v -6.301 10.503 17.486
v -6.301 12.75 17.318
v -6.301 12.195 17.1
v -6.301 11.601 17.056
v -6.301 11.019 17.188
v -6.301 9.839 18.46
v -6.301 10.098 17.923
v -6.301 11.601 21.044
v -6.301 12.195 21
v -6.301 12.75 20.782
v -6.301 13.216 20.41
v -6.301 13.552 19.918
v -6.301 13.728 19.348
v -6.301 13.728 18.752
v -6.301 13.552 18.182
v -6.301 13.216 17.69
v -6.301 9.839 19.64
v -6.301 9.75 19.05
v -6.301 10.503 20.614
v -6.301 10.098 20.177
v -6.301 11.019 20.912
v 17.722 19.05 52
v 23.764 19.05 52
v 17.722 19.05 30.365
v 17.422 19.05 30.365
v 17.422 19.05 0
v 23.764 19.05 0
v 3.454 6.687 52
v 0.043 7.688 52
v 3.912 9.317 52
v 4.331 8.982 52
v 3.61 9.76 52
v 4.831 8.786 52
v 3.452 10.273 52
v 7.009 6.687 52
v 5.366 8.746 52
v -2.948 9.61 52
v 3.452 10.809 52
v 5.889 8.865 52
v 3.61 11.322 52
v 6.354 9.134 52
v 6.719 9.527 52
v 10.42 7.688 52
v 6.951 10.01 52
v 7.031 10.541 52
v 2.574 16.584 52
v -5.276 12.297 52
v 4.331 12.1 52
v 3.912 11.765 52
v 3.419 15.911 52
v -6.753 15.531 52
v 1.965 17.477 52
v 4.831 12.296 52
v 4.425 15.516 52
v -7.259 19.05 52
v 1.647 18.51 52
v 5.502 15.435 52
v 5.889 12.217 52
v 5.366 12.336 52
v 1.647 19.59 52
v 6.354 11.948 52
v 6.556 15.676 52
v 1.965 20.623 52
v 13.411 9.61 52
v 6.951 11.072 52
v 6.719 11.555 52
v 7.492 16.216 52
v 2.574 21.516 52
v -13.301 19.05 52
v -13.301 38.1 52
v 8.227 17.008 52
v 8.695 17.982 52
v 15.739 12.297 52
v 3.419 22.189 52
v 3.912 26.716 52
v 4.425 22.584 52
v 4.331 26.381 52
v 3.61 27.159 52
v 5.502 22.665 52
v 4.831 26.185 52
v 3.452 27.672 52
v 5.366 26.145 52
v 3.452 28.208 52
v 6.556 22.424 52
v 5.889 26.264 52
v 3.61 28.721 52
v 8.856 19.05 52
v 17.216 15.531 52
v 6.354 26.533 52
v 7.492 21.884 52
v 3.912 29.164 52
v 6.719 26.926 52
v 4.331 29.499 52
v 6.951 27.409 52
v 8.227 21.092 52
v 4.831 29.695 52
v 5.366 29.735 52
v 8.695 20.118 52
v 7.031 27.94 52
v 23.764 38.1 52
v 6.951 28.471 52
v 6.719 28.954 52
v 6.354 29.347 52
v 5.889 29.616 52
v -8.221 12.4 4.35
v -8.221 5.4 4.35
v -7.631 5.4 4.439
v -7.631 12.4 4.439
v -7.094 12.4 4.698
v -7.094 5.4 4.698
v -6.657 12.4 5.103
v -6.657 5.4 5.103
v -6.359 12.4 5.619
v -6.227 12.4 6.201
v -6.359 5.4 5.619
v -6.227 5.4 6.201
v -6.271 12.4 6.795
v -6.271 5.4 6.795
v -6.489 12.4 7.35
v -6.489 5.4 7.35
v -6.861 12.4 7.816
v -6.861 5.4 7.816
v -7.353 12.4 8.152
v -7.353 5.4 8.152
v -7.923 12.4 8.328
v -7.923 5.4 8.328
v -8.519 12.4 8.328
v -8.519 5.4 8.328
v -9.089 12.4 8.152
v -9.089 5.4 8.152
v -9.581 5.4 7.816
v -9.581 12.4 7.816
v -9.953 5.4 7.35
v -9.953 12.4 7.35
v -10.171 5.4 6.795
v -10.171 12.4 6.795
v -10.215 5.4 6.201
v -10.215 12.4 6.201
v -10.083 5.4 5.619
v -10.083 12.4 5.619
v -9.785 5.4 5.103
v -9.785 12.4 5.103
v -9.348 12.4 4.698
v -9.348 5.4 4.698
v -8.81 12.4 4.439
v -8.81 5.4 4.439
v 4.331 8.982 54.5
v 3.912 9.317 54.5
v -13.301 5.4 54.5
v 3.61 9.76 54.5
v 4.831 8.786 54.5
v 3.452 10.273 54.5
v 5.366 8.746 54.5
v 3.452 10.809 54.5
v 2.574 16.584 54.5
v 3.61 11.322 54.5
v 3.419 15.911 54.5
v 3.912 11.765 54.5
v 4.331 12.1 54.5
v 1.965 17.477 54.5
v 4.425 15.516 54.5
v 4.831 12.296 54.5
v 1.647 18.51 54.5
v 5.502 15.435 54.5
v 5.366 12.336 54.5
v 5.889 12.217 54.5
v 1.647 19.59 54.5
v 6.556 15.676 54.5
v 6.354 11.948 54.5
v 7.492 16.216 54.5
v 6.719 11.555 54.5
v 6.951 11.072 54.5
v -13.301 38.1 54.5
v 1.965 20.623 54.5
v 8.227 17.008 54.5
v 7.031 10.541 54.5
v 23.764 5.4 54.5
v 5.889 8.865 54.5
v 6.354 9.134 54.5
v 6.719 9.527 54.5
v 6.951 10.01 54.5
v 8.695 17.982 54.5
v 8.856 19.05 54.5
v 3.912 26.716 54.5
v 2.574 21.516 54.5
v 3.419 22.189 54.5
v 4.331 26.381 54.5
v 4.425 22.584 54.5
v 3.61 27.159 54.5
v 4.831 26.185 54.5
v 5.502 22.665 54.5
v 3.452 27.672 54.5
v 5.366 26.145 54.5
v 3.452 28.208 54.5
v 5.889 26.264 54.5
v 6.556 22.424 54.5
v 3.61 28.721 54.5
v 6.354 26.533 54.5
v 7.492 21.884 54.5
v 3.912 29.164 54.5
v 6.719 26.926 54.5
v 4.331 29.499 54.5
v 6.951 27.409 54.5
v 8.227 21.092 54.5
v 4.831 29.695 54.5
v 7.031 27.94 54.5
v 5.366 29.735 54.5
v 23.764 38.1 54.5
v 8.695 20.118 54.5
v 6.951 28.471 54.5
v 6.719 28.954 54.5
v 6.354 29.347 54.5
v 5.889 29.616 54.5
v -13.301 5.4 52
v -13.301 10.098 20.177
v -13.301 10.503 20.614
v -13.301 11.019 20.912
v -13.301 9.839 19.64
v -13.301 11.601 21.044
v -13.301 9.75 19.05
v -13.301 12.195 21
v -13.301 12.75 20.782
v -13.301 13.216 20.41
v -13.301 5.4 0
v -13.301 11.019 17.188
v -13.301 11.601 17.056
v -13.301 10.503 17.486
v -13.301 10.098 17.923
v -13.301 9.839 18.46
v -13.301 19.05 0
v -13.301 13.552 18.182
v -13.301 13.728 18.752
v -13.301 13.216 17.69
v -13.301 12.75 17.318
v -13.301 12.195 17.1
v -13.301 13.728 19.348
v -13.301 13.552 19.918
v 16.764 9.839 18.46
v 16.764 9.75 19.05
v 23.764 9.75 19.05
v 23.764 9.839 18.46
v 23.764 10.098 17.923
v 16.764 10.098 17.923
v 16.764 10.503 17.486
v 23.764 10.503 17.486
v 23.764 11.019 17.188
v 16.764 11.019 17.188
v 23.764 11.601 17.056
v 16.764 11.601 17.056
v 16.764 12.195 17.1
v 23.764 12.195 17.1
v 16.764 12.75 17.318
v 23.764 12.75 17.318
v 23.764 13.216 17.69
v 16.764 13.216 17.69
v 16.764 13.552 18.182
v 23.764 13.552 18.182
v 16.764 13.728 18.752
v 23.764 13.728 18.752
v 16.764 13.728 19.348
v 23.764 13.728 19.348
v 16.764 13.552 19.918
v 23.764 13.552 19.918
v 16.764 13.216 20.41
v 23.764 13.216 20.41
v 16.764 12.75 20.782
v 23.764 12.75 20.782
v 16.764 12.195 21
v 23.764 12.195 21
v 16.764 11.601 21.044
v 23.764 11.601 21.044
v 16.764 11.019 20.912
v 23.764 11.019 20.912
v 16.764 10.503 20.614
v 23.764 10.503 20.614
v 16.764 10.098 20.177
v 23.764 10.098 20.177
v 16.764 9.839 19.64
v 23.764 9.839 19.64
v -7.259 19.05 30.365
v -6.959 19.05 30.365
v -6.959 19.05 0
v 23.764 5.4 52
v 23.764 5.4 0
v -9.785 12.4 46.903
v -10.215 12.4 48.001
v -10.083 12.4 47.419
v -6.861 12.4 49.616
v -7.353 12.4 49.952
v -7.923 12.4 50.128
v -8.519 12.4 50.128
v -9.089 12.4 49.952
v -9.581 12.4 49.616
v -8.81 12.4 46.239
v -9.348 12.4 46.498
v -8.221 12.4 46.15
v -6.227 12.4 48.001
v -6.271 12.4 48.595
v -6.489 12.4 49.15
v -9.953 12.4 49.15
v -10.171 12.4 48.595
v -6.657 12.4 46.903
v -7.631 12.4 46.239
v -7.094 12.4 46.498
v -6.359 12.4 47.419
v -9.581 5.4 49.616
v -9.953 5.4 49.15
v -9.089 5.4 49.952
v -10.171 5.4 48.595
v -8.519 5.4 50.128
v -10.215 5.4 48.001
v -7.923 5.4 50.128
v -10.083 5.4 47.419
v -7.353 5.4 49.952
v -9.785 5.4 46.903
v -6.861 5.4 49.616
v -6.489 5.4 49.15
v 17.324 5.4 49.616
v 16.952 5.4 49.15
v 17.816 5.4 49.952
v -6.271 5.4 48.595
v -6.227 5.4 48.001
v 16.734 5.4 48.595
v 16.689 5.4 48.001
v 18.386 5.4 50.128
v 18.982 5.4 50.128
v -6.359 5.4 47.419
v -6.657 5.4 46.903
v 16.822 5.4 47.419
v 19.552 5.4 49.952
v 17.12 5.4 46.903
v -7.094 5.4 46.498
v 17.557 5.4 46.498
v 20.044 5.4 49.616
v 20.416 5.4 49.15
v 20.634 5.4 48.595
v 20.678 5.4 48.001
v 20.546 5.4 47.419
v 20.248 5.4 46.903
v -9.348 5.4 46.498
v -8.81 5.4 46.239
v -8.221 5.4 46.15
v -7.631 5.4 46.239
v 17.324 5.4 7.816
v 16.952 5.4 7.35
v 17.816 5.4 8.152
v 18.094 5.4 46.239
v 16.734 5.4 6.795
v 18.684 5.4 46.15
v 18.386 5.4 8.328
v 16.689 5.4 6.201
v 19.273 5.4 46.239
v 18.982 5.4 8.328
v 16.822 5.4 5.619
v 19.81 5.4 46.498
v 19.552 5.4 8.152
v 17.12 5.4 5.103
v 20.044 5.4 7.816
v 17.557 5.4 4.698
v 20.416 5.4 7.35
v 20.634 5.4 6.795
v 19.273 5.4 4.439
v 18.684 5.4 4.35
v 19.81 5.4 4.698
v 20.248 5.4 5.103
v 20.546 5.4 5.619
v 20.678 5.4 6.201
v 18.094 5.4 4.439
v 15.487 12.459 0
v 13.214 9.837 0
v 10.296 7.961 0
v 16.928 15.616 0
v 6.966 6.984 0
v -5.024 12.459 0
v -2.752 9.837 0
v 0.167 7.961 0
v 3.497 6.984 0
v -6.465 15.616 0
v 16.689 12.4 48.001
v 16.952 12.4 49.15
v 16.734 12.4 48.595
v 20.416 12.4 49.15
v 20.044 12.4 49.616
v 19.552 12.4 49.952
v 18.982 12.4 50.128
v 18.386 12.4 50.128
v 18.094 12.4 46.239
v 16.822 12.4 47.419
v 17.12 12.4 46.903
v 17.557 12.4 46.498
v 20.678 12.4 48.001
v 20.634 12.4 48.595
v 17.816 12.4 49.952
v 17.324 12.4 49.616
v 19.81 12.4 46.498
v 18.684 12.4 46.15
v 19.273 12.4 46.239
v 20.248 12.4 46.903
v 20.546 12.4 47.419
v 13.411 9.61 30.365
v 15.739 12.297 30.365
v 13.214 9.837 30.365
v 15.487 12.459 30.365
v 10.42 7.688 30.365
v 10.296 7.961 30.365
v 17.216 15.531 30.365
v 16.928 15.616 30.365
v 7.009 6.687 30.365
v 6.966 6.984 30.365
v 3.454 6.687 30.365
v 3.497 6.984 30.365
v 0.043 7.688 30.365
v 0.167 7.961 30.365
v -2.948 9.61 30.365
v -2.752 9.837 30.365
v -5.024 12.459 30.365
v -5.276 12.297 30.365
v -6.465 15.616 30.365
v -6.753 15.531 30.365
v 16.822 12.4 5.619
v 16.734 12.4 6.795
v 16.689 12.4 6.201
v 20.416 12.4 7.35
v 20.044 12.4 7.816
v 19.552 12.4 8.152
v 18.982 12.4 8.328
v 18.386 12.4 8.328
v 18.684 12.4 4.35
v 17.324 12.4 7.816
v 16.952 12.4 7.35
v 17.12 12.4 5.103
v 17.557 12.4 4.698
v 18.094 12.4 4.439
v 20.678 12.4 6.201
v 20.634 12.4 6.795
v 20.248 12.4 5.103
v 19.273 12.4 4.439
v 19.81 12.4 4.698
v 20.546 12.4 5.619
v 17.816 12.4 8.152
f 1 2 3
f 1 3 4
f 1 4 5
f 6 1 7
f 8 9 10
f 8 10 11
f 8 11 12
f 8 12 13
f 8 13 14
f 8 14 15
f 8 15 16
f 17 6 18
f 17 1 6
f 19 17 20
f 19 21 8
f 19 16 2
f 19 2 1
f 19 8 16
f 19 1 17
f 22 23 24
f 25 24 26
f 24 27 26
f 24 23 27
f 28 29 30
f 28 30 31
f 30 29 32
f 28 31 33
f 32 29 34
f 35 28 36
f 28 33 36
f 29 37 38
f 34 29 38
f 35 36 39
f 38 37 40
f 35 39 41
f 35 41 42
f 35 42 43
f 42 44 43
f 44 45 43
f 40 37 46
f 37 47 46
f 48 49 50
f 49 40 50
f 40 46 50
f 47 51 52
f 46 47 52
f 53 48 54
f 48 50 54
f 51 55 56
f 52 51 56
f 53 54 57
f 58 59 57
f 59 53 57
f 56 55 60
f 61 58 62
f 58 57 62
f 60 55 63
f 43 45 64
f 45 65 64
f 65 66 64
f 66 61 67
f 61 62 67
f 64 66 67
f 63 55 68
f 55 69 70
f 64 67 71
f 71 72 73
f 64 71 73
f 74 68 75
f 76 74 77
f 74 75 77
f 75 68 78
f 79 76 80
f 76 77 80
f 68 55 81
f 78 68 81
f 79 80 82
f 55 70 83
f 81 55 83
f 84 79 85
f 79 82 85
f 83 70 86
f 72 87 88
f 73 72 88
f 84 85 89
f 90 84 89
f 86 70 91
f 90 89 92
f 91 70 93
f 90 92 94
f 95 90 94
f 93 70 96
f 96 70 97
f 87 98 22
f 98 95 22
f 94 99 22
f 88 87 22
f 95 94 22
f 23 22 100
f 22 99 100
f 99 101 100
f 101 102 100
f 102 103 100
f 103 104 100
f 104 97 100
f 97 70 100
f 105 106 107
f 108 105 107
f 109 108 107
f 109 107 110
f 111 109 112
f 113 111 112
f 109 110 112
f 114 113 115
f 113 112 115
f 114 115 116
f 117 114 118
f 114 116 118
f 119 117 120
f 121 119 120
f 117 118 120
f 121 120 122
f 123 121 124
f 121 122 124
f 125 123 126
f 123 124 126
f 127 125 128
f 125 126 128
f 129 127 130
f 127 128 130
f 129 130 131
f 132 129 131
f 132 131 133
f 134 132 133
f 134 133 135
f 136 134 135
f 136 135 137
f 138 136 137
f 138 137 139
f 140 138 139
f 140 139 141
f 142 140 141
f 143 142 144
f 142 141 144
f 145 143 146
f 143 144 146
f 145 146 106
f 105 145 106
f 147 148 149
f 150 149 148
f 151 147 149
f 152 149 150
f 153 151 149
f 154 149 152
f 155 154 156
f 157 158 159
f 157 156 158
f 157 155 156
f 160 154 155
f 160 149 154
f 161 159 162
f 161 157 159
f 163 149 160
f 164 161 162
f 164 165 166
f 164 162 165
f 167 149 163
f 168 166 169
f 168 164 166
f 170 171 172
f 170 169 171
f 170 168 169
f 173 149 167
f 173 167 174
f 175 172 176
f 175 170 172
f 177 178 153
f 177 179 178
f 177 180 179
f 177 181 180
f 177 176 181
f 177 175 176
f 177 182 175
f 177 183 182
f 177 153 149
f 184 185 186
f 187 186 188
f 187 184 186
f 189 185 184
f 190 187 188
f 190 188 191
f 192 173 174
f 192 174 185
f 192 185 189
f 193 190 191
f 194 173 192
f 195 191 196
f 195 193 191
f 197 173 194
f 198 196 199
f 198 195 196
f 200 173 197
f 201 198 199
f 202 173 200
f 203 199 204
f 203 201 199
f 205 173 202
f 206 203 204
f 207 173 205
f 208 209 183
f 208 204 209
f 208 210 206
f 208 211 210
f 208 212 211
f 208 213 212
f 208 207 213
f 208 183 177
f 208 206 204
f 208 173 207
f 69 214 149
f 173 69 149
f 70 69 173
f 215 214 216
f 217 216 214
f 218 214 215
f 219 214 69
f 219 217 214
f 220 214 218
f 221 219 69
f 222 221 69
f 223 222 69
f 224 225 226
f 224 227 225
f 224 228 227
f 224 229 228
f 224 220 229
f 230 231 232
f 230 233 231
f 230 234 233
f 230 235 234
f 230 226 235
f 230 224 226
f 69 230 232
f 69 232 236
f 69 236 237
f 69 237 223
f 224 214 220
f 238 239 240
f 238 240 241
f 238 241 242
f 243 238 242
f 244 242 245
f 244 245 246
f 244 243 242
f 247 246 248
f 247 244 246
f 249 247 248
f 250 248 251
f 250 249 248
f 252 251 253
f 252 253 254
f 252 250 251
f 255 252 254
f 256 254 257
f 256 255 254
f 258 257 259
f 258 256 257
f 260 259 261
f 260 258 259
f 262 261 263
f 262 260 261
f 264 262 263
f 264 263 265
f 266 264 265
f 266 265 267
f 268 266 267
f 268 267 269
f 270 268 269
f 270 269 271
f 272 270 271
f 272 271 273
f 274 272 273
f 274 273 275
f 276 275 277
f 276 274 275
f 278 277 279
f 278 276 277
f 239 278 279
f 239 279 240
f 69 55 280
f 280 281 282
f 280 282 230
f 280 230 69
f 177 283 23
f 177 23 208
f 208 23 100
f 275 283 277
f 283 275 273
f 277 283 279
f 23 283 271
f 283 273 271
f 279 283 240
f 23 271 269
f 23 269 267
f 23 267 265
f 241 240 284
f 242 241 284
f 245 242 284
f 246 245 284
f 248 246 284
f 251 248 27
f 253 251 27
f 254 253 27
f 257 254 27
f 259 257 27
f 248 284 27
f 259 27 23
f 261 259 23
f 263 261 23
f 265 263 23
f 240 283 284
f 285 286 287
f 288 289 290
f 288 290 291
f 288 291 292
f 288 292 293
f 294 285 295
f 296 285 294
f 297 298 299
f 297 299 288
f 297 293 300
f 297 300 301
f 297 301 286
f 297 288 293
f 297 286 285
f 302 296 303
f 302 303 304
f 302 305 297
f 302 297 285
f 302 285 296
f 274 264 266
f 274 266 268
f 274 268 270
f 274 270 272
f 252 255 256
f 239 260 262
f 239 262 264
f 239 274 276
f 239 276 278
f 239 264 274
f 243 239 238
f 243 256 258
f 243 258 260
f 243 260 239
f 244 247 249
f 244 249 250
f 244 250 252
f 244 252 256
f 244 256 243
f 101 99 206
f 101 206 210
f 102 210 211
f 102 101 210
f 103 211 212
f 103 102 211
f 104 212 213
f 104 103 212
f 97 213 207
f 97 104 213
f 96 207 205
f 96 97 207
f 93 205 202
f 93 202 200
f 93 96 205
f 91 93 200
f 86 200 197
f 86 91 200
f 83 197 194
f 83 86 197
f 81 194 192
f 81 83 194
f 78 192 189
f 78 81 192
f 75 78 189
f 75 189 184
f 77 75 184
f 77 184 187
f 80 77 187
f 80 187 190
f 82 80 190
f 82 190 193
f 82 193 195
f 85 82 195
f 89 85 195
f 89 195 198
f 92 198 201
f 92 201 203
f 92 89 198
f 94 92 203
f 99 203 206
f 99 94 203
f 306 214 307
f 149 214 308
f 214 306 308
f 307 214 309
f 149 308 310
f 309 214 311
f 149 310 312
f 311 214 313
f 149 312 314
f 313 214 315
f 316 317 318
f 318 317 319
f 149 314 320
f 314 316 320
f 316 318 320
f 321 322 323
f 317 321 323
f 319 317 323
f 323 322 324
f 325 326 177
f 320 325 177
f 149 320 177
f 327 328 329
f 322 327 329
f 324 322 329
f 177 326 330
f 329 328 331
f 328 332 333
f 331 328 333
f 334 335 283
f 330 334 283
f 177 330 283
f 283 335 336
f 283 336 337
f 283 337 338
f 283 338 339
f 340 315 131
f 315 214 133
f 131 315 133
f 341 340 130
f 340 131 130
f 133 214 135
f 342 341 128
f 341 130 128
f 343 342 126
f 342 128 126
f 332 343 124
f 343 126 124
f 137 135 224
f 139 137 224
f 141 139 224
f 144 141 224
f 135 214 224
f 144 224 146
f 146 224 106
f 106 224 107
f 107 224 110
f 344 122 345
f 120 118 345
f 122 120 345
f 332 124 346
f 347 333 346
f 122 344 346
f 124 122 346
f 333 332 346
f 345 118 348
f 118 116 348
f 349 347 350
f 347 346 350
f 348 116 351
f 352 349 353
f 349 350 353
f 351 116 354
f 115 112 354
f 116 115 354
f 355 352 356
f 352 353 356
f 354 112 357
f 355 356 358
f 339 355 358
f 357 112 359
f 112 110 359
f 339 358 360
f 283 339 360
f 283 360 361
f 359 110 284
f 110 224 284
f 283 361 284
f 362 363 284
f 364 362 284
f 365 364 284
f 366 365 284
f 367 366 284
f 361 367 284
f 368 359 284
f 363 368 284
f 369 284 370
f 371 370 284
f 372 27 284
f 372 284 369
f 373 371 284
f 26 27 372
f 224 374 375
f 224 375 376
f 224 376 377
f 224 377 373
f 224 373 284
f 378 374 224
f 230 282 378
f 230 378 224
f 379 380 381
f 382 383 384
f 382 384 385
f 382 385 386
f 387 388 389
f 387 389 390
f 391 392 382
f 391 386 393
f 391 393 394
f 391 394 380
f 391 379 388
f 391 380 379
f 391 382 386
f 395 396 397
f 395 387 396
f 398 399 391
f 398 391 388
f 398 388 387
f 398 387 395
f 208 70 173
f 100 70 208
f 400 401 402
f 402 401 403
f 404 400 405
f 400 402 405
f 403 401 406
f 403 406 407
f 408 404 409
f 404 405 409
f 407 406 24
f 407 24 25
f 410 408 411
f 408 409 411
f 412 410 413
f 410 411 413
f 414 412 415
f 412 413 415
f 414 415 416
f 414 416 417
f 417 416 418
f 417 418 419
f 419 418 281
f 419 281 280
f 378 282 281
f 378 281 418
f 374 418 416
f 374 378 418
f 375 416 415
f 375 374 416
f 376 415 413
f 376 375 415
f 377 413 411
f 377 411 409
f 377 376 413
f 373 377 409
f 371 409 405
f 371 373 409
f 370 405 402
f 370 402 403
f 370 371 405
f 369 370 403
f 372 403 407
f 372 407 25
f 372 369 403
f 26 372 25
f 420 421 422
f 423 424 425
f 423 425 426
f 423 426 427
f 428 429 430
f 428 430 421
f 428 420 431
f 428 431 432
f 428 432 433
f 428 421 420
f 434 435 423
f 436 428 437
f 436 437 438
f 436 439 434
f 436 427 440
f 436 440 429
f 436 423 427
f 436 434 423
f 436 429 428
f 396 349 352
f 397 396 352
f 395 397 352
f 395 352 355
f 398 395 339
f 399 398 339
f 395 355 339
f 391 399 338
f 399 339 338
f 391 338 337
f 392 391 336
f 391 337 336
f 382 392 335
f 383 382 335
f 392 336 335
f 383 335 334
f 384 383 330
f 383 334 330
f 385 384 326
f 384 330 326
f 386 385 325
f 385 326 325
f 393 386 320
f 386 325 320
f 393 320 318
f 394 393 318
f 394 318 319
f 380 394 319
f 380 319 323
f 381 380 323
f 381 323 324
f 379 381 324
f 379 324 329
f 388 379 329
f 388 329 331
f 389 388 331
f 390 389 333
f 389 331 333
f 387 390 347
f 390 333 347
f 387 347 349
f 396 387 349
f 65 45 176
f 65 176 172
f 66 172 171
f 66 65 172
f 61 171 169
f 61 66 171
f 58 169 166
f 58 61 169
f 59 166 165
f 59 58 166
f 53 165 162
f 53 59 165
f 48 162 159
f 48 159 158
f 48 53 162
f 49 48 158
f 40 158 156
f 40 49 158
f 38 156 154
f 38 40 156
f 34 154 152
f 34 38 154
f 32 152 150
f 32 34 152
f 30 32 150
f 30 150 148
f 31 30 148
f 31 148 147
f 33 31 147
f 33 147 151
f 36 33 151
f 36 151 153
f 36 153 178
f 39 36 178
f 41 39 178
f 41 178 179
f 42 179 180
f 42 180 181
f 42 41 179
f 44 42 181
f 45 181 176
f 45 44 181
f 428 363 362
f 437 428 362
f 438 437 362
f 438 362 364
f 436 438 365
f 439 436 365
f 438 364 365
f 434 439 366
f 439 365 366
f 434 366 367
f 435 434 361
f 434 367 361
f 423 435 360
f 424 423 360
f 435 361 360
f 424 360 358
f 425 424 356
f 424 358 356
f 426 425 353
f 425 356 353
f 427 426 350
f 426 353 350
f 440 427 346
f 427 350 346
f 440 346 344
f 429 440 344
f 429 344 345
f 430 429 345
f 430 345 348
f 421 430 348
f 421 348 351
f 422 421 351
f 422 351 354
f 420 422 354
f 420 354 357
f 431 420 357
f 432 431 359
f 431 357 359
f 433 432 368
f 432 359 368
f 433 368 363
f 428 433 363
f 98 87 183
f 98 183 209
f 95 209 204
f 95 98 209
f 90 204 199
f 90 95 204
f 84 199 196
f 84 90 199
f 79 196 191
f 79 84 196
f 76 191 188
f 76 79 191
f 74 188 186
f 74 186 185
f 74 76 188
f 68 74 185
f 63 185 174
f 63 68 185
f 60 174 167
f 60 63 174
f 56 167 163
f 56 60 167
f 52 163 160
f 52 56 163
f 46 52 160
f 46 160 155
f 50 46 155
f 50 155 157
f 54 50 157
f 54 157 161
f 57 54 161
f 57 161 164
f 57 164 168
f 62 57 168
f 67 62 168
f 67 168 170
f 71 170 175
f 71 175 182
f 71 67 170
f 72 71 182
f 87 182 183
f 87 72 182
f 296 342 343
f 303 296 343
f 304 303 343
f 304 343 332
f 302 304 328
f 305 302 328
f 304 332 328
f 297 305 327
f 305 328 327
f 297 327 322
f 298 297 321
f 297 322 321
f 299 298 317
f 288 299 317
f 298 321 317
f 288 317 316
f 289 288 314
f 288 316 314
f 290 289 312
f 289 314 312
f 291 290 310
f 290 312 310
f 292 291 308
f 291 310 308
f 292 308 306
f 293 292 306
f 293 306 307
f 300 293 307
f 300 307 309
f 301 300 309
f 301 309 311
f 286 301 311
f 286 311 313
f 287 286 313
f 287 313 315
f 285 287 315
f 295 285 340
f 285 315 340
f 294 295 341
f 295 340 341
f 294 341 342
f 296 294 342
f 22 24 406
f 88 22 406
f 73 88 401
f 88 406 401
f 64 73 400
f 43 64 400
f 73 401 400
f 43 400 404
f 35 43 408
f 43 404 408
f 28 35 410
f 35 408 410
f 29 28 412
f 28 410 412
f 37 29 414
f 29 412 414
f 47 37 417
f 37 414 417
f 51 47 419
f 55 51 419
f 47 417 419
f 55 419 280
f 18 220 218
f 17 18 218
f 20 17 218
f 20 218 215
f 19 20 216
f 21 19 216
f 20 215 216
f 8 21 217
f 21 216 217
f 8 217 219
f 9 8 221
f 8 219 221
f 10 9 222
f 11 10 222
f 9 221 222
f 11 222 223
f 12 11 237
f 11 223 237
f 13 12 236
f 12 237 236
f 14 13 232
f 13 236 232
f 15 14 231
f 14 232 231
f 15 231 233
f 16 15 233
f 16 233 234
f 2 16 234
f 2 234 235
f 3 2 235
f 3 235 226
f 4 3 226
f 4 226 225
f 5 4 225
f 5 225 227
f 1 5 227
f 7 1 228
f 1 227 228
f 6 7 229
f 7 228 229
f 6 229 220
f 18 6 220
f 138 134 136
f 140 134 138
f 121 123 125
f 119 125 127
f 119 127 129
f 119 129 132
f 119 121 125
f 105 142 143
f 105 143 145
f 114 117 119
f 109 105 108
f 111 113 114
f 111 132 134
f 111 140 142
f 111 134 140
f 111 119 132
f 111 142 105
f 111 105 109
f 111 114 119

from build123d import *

# Parameters (mm, degrees)
BOSS_EXTRUDE1_DEPTH = 30.364999976
BOSS_EXTRUDE2_DEPTH = 21.63499991
SKETCH4_W           = 37.064796383
SKETCH4_H           = 32.7
SKETCH4_R           = 3.625
SKETCH4_R_2         = 1.8
BOSS_EXTRUDE3_DEPTH = 2.5
SKETCH5_R           = 2
CUT_EXTRUDE1_DEPTH  = 7
SKETCH6_R           = 2.000000064
CUT_EXTRUDE2_DEPTH  = 7
CUT_EXTRUDE3_START  = -7
SKETCH7_R           = 2
CUT_EXTRUDE3_DEPTH  = 7


with BuildPart() as part:
    # Sketch1 → Boss-Extrude1 (new body)
    with BuildSketch(Plane.XY):
        with BuildLine():
            Line((23.763847258, 19.05), (23.763847258, 5.4))
            Line((23.763847258, 5.4), (-13.300949125, 5.4))
            Line((-13.300949125, 5.4), (-13.300949125, 19.05))
            Line((-13.300949125, 19.05), (-6.958949124, 19.05))
            ThreePointArc((-6.958949124, 19.05), (5.231449067, 6.859601809), (17.421847257, 19.05))
            Line((17.421847257, 19.05), (23.763847258, 19.05))
        make_face()
    extrude(amount=BOSS_EXTRUDE1_DEPTH)

    # Sketch3 → Boss-Extrude2 (add)
    with BuildSketch(Plane.XY.offset(30.364999976)):
        with BuildLine():
            Line((-13.300949125, 19.05), (-13.300949125, 5.4))
            Line((-13.300949125, 5.4), (23.763847258, 5.4))
            Line((23.763847258, 5.4), (23.763847258, 19.05))
            Line((23.763847258, 19.05), (17.72184715, 19.05))
            ThreePointArc((17.72184715, 19.05), (5.231449012, 6.559601862), (-7.258949126, 19.05))
            Line((-7.258949126, 19.05), (-13.300949125, 19.05))
        make_face()
    extrude(amount=BOSS_EXTRUDE2_DEPTH)

    # Sketch4 → Boss-Extrude3 (add)
    with BuildSketch(Plane.XY.offset(51.999999886)):
        with Locations((5.231449067, 21.75)):
            Rectangle(SKETCH4_W, SKETCH4_H)
        with Locations((5.231449093, 19.05)):
            Circle(SKETCH4_R, mode=Mode.SUBTRACT)
        with Locations((5.231449093, 10.541)):
            Circle(SKETCH4_R_2, mode=Mode.SUBTRACT)
        with Locations((5.231449093, 27.94)):
            Circle(SKETCH4_R_2, mode=Mode.SUBTRACT)
    extrude(amount=BOSS_EXTRUDE3_DEPTH)

    # Sketch5 → Cut-Extrude1 (cut)
    with BuildSketch(Plane.XZ.offset(-5.4)):
        with Locations(Location((-8.220949125, 48.149999886, 0), (0, 0, 270))):
            Circle(SKETCH5_R)
        with Locations(Location((18.683847258, 48.149999886, 0), (0, 0, 270))):
            Circle(SKETCH5_R)
        with Locations(Location((-8.220949125, 6.35, 0), (0, 0, 270))):
            Circle(SKETCH5_R)
        with Locations(Location((18.683847258, 6.35, 0), (0, 0, 270))):
            Circle(SKETCH5_R)
    extrude(amount=-CUT_EXTRUDE1_DEPTH, mode=Mode.SUBTRACT)

    # Sketch6 → Cut-Extrude2 (cut)
    with BuildSketch(Plane.ZY.offset(13.300949125)):
        with Locations(Location((19.05, 11.75, 0), (0, 0, 270))):
            Circle(SKETCH6_R)
    extrude(amount=-CUT_EXTRUDE2_DEPTH, mode=Mode.SUBTRACT)

    # Sketch7 → Cut-Extrude3 (cut)
    with BuildSketch(Plane(origin=(23.763847258, 0, 0), x_dir=(0, 0, -1), z_dir=(1, 0, 0)).offset(CUT_EXTRUDE3_START)):
        with Locations(Location((-19.05, 11.75, 0), (0, 0, 270))):
            Circle(SKETCH7_R)
    extrude(amount=CUT_EXTRUDE3_DEPTH, mode=Mode.SUBTRACT)


solid = part.part
